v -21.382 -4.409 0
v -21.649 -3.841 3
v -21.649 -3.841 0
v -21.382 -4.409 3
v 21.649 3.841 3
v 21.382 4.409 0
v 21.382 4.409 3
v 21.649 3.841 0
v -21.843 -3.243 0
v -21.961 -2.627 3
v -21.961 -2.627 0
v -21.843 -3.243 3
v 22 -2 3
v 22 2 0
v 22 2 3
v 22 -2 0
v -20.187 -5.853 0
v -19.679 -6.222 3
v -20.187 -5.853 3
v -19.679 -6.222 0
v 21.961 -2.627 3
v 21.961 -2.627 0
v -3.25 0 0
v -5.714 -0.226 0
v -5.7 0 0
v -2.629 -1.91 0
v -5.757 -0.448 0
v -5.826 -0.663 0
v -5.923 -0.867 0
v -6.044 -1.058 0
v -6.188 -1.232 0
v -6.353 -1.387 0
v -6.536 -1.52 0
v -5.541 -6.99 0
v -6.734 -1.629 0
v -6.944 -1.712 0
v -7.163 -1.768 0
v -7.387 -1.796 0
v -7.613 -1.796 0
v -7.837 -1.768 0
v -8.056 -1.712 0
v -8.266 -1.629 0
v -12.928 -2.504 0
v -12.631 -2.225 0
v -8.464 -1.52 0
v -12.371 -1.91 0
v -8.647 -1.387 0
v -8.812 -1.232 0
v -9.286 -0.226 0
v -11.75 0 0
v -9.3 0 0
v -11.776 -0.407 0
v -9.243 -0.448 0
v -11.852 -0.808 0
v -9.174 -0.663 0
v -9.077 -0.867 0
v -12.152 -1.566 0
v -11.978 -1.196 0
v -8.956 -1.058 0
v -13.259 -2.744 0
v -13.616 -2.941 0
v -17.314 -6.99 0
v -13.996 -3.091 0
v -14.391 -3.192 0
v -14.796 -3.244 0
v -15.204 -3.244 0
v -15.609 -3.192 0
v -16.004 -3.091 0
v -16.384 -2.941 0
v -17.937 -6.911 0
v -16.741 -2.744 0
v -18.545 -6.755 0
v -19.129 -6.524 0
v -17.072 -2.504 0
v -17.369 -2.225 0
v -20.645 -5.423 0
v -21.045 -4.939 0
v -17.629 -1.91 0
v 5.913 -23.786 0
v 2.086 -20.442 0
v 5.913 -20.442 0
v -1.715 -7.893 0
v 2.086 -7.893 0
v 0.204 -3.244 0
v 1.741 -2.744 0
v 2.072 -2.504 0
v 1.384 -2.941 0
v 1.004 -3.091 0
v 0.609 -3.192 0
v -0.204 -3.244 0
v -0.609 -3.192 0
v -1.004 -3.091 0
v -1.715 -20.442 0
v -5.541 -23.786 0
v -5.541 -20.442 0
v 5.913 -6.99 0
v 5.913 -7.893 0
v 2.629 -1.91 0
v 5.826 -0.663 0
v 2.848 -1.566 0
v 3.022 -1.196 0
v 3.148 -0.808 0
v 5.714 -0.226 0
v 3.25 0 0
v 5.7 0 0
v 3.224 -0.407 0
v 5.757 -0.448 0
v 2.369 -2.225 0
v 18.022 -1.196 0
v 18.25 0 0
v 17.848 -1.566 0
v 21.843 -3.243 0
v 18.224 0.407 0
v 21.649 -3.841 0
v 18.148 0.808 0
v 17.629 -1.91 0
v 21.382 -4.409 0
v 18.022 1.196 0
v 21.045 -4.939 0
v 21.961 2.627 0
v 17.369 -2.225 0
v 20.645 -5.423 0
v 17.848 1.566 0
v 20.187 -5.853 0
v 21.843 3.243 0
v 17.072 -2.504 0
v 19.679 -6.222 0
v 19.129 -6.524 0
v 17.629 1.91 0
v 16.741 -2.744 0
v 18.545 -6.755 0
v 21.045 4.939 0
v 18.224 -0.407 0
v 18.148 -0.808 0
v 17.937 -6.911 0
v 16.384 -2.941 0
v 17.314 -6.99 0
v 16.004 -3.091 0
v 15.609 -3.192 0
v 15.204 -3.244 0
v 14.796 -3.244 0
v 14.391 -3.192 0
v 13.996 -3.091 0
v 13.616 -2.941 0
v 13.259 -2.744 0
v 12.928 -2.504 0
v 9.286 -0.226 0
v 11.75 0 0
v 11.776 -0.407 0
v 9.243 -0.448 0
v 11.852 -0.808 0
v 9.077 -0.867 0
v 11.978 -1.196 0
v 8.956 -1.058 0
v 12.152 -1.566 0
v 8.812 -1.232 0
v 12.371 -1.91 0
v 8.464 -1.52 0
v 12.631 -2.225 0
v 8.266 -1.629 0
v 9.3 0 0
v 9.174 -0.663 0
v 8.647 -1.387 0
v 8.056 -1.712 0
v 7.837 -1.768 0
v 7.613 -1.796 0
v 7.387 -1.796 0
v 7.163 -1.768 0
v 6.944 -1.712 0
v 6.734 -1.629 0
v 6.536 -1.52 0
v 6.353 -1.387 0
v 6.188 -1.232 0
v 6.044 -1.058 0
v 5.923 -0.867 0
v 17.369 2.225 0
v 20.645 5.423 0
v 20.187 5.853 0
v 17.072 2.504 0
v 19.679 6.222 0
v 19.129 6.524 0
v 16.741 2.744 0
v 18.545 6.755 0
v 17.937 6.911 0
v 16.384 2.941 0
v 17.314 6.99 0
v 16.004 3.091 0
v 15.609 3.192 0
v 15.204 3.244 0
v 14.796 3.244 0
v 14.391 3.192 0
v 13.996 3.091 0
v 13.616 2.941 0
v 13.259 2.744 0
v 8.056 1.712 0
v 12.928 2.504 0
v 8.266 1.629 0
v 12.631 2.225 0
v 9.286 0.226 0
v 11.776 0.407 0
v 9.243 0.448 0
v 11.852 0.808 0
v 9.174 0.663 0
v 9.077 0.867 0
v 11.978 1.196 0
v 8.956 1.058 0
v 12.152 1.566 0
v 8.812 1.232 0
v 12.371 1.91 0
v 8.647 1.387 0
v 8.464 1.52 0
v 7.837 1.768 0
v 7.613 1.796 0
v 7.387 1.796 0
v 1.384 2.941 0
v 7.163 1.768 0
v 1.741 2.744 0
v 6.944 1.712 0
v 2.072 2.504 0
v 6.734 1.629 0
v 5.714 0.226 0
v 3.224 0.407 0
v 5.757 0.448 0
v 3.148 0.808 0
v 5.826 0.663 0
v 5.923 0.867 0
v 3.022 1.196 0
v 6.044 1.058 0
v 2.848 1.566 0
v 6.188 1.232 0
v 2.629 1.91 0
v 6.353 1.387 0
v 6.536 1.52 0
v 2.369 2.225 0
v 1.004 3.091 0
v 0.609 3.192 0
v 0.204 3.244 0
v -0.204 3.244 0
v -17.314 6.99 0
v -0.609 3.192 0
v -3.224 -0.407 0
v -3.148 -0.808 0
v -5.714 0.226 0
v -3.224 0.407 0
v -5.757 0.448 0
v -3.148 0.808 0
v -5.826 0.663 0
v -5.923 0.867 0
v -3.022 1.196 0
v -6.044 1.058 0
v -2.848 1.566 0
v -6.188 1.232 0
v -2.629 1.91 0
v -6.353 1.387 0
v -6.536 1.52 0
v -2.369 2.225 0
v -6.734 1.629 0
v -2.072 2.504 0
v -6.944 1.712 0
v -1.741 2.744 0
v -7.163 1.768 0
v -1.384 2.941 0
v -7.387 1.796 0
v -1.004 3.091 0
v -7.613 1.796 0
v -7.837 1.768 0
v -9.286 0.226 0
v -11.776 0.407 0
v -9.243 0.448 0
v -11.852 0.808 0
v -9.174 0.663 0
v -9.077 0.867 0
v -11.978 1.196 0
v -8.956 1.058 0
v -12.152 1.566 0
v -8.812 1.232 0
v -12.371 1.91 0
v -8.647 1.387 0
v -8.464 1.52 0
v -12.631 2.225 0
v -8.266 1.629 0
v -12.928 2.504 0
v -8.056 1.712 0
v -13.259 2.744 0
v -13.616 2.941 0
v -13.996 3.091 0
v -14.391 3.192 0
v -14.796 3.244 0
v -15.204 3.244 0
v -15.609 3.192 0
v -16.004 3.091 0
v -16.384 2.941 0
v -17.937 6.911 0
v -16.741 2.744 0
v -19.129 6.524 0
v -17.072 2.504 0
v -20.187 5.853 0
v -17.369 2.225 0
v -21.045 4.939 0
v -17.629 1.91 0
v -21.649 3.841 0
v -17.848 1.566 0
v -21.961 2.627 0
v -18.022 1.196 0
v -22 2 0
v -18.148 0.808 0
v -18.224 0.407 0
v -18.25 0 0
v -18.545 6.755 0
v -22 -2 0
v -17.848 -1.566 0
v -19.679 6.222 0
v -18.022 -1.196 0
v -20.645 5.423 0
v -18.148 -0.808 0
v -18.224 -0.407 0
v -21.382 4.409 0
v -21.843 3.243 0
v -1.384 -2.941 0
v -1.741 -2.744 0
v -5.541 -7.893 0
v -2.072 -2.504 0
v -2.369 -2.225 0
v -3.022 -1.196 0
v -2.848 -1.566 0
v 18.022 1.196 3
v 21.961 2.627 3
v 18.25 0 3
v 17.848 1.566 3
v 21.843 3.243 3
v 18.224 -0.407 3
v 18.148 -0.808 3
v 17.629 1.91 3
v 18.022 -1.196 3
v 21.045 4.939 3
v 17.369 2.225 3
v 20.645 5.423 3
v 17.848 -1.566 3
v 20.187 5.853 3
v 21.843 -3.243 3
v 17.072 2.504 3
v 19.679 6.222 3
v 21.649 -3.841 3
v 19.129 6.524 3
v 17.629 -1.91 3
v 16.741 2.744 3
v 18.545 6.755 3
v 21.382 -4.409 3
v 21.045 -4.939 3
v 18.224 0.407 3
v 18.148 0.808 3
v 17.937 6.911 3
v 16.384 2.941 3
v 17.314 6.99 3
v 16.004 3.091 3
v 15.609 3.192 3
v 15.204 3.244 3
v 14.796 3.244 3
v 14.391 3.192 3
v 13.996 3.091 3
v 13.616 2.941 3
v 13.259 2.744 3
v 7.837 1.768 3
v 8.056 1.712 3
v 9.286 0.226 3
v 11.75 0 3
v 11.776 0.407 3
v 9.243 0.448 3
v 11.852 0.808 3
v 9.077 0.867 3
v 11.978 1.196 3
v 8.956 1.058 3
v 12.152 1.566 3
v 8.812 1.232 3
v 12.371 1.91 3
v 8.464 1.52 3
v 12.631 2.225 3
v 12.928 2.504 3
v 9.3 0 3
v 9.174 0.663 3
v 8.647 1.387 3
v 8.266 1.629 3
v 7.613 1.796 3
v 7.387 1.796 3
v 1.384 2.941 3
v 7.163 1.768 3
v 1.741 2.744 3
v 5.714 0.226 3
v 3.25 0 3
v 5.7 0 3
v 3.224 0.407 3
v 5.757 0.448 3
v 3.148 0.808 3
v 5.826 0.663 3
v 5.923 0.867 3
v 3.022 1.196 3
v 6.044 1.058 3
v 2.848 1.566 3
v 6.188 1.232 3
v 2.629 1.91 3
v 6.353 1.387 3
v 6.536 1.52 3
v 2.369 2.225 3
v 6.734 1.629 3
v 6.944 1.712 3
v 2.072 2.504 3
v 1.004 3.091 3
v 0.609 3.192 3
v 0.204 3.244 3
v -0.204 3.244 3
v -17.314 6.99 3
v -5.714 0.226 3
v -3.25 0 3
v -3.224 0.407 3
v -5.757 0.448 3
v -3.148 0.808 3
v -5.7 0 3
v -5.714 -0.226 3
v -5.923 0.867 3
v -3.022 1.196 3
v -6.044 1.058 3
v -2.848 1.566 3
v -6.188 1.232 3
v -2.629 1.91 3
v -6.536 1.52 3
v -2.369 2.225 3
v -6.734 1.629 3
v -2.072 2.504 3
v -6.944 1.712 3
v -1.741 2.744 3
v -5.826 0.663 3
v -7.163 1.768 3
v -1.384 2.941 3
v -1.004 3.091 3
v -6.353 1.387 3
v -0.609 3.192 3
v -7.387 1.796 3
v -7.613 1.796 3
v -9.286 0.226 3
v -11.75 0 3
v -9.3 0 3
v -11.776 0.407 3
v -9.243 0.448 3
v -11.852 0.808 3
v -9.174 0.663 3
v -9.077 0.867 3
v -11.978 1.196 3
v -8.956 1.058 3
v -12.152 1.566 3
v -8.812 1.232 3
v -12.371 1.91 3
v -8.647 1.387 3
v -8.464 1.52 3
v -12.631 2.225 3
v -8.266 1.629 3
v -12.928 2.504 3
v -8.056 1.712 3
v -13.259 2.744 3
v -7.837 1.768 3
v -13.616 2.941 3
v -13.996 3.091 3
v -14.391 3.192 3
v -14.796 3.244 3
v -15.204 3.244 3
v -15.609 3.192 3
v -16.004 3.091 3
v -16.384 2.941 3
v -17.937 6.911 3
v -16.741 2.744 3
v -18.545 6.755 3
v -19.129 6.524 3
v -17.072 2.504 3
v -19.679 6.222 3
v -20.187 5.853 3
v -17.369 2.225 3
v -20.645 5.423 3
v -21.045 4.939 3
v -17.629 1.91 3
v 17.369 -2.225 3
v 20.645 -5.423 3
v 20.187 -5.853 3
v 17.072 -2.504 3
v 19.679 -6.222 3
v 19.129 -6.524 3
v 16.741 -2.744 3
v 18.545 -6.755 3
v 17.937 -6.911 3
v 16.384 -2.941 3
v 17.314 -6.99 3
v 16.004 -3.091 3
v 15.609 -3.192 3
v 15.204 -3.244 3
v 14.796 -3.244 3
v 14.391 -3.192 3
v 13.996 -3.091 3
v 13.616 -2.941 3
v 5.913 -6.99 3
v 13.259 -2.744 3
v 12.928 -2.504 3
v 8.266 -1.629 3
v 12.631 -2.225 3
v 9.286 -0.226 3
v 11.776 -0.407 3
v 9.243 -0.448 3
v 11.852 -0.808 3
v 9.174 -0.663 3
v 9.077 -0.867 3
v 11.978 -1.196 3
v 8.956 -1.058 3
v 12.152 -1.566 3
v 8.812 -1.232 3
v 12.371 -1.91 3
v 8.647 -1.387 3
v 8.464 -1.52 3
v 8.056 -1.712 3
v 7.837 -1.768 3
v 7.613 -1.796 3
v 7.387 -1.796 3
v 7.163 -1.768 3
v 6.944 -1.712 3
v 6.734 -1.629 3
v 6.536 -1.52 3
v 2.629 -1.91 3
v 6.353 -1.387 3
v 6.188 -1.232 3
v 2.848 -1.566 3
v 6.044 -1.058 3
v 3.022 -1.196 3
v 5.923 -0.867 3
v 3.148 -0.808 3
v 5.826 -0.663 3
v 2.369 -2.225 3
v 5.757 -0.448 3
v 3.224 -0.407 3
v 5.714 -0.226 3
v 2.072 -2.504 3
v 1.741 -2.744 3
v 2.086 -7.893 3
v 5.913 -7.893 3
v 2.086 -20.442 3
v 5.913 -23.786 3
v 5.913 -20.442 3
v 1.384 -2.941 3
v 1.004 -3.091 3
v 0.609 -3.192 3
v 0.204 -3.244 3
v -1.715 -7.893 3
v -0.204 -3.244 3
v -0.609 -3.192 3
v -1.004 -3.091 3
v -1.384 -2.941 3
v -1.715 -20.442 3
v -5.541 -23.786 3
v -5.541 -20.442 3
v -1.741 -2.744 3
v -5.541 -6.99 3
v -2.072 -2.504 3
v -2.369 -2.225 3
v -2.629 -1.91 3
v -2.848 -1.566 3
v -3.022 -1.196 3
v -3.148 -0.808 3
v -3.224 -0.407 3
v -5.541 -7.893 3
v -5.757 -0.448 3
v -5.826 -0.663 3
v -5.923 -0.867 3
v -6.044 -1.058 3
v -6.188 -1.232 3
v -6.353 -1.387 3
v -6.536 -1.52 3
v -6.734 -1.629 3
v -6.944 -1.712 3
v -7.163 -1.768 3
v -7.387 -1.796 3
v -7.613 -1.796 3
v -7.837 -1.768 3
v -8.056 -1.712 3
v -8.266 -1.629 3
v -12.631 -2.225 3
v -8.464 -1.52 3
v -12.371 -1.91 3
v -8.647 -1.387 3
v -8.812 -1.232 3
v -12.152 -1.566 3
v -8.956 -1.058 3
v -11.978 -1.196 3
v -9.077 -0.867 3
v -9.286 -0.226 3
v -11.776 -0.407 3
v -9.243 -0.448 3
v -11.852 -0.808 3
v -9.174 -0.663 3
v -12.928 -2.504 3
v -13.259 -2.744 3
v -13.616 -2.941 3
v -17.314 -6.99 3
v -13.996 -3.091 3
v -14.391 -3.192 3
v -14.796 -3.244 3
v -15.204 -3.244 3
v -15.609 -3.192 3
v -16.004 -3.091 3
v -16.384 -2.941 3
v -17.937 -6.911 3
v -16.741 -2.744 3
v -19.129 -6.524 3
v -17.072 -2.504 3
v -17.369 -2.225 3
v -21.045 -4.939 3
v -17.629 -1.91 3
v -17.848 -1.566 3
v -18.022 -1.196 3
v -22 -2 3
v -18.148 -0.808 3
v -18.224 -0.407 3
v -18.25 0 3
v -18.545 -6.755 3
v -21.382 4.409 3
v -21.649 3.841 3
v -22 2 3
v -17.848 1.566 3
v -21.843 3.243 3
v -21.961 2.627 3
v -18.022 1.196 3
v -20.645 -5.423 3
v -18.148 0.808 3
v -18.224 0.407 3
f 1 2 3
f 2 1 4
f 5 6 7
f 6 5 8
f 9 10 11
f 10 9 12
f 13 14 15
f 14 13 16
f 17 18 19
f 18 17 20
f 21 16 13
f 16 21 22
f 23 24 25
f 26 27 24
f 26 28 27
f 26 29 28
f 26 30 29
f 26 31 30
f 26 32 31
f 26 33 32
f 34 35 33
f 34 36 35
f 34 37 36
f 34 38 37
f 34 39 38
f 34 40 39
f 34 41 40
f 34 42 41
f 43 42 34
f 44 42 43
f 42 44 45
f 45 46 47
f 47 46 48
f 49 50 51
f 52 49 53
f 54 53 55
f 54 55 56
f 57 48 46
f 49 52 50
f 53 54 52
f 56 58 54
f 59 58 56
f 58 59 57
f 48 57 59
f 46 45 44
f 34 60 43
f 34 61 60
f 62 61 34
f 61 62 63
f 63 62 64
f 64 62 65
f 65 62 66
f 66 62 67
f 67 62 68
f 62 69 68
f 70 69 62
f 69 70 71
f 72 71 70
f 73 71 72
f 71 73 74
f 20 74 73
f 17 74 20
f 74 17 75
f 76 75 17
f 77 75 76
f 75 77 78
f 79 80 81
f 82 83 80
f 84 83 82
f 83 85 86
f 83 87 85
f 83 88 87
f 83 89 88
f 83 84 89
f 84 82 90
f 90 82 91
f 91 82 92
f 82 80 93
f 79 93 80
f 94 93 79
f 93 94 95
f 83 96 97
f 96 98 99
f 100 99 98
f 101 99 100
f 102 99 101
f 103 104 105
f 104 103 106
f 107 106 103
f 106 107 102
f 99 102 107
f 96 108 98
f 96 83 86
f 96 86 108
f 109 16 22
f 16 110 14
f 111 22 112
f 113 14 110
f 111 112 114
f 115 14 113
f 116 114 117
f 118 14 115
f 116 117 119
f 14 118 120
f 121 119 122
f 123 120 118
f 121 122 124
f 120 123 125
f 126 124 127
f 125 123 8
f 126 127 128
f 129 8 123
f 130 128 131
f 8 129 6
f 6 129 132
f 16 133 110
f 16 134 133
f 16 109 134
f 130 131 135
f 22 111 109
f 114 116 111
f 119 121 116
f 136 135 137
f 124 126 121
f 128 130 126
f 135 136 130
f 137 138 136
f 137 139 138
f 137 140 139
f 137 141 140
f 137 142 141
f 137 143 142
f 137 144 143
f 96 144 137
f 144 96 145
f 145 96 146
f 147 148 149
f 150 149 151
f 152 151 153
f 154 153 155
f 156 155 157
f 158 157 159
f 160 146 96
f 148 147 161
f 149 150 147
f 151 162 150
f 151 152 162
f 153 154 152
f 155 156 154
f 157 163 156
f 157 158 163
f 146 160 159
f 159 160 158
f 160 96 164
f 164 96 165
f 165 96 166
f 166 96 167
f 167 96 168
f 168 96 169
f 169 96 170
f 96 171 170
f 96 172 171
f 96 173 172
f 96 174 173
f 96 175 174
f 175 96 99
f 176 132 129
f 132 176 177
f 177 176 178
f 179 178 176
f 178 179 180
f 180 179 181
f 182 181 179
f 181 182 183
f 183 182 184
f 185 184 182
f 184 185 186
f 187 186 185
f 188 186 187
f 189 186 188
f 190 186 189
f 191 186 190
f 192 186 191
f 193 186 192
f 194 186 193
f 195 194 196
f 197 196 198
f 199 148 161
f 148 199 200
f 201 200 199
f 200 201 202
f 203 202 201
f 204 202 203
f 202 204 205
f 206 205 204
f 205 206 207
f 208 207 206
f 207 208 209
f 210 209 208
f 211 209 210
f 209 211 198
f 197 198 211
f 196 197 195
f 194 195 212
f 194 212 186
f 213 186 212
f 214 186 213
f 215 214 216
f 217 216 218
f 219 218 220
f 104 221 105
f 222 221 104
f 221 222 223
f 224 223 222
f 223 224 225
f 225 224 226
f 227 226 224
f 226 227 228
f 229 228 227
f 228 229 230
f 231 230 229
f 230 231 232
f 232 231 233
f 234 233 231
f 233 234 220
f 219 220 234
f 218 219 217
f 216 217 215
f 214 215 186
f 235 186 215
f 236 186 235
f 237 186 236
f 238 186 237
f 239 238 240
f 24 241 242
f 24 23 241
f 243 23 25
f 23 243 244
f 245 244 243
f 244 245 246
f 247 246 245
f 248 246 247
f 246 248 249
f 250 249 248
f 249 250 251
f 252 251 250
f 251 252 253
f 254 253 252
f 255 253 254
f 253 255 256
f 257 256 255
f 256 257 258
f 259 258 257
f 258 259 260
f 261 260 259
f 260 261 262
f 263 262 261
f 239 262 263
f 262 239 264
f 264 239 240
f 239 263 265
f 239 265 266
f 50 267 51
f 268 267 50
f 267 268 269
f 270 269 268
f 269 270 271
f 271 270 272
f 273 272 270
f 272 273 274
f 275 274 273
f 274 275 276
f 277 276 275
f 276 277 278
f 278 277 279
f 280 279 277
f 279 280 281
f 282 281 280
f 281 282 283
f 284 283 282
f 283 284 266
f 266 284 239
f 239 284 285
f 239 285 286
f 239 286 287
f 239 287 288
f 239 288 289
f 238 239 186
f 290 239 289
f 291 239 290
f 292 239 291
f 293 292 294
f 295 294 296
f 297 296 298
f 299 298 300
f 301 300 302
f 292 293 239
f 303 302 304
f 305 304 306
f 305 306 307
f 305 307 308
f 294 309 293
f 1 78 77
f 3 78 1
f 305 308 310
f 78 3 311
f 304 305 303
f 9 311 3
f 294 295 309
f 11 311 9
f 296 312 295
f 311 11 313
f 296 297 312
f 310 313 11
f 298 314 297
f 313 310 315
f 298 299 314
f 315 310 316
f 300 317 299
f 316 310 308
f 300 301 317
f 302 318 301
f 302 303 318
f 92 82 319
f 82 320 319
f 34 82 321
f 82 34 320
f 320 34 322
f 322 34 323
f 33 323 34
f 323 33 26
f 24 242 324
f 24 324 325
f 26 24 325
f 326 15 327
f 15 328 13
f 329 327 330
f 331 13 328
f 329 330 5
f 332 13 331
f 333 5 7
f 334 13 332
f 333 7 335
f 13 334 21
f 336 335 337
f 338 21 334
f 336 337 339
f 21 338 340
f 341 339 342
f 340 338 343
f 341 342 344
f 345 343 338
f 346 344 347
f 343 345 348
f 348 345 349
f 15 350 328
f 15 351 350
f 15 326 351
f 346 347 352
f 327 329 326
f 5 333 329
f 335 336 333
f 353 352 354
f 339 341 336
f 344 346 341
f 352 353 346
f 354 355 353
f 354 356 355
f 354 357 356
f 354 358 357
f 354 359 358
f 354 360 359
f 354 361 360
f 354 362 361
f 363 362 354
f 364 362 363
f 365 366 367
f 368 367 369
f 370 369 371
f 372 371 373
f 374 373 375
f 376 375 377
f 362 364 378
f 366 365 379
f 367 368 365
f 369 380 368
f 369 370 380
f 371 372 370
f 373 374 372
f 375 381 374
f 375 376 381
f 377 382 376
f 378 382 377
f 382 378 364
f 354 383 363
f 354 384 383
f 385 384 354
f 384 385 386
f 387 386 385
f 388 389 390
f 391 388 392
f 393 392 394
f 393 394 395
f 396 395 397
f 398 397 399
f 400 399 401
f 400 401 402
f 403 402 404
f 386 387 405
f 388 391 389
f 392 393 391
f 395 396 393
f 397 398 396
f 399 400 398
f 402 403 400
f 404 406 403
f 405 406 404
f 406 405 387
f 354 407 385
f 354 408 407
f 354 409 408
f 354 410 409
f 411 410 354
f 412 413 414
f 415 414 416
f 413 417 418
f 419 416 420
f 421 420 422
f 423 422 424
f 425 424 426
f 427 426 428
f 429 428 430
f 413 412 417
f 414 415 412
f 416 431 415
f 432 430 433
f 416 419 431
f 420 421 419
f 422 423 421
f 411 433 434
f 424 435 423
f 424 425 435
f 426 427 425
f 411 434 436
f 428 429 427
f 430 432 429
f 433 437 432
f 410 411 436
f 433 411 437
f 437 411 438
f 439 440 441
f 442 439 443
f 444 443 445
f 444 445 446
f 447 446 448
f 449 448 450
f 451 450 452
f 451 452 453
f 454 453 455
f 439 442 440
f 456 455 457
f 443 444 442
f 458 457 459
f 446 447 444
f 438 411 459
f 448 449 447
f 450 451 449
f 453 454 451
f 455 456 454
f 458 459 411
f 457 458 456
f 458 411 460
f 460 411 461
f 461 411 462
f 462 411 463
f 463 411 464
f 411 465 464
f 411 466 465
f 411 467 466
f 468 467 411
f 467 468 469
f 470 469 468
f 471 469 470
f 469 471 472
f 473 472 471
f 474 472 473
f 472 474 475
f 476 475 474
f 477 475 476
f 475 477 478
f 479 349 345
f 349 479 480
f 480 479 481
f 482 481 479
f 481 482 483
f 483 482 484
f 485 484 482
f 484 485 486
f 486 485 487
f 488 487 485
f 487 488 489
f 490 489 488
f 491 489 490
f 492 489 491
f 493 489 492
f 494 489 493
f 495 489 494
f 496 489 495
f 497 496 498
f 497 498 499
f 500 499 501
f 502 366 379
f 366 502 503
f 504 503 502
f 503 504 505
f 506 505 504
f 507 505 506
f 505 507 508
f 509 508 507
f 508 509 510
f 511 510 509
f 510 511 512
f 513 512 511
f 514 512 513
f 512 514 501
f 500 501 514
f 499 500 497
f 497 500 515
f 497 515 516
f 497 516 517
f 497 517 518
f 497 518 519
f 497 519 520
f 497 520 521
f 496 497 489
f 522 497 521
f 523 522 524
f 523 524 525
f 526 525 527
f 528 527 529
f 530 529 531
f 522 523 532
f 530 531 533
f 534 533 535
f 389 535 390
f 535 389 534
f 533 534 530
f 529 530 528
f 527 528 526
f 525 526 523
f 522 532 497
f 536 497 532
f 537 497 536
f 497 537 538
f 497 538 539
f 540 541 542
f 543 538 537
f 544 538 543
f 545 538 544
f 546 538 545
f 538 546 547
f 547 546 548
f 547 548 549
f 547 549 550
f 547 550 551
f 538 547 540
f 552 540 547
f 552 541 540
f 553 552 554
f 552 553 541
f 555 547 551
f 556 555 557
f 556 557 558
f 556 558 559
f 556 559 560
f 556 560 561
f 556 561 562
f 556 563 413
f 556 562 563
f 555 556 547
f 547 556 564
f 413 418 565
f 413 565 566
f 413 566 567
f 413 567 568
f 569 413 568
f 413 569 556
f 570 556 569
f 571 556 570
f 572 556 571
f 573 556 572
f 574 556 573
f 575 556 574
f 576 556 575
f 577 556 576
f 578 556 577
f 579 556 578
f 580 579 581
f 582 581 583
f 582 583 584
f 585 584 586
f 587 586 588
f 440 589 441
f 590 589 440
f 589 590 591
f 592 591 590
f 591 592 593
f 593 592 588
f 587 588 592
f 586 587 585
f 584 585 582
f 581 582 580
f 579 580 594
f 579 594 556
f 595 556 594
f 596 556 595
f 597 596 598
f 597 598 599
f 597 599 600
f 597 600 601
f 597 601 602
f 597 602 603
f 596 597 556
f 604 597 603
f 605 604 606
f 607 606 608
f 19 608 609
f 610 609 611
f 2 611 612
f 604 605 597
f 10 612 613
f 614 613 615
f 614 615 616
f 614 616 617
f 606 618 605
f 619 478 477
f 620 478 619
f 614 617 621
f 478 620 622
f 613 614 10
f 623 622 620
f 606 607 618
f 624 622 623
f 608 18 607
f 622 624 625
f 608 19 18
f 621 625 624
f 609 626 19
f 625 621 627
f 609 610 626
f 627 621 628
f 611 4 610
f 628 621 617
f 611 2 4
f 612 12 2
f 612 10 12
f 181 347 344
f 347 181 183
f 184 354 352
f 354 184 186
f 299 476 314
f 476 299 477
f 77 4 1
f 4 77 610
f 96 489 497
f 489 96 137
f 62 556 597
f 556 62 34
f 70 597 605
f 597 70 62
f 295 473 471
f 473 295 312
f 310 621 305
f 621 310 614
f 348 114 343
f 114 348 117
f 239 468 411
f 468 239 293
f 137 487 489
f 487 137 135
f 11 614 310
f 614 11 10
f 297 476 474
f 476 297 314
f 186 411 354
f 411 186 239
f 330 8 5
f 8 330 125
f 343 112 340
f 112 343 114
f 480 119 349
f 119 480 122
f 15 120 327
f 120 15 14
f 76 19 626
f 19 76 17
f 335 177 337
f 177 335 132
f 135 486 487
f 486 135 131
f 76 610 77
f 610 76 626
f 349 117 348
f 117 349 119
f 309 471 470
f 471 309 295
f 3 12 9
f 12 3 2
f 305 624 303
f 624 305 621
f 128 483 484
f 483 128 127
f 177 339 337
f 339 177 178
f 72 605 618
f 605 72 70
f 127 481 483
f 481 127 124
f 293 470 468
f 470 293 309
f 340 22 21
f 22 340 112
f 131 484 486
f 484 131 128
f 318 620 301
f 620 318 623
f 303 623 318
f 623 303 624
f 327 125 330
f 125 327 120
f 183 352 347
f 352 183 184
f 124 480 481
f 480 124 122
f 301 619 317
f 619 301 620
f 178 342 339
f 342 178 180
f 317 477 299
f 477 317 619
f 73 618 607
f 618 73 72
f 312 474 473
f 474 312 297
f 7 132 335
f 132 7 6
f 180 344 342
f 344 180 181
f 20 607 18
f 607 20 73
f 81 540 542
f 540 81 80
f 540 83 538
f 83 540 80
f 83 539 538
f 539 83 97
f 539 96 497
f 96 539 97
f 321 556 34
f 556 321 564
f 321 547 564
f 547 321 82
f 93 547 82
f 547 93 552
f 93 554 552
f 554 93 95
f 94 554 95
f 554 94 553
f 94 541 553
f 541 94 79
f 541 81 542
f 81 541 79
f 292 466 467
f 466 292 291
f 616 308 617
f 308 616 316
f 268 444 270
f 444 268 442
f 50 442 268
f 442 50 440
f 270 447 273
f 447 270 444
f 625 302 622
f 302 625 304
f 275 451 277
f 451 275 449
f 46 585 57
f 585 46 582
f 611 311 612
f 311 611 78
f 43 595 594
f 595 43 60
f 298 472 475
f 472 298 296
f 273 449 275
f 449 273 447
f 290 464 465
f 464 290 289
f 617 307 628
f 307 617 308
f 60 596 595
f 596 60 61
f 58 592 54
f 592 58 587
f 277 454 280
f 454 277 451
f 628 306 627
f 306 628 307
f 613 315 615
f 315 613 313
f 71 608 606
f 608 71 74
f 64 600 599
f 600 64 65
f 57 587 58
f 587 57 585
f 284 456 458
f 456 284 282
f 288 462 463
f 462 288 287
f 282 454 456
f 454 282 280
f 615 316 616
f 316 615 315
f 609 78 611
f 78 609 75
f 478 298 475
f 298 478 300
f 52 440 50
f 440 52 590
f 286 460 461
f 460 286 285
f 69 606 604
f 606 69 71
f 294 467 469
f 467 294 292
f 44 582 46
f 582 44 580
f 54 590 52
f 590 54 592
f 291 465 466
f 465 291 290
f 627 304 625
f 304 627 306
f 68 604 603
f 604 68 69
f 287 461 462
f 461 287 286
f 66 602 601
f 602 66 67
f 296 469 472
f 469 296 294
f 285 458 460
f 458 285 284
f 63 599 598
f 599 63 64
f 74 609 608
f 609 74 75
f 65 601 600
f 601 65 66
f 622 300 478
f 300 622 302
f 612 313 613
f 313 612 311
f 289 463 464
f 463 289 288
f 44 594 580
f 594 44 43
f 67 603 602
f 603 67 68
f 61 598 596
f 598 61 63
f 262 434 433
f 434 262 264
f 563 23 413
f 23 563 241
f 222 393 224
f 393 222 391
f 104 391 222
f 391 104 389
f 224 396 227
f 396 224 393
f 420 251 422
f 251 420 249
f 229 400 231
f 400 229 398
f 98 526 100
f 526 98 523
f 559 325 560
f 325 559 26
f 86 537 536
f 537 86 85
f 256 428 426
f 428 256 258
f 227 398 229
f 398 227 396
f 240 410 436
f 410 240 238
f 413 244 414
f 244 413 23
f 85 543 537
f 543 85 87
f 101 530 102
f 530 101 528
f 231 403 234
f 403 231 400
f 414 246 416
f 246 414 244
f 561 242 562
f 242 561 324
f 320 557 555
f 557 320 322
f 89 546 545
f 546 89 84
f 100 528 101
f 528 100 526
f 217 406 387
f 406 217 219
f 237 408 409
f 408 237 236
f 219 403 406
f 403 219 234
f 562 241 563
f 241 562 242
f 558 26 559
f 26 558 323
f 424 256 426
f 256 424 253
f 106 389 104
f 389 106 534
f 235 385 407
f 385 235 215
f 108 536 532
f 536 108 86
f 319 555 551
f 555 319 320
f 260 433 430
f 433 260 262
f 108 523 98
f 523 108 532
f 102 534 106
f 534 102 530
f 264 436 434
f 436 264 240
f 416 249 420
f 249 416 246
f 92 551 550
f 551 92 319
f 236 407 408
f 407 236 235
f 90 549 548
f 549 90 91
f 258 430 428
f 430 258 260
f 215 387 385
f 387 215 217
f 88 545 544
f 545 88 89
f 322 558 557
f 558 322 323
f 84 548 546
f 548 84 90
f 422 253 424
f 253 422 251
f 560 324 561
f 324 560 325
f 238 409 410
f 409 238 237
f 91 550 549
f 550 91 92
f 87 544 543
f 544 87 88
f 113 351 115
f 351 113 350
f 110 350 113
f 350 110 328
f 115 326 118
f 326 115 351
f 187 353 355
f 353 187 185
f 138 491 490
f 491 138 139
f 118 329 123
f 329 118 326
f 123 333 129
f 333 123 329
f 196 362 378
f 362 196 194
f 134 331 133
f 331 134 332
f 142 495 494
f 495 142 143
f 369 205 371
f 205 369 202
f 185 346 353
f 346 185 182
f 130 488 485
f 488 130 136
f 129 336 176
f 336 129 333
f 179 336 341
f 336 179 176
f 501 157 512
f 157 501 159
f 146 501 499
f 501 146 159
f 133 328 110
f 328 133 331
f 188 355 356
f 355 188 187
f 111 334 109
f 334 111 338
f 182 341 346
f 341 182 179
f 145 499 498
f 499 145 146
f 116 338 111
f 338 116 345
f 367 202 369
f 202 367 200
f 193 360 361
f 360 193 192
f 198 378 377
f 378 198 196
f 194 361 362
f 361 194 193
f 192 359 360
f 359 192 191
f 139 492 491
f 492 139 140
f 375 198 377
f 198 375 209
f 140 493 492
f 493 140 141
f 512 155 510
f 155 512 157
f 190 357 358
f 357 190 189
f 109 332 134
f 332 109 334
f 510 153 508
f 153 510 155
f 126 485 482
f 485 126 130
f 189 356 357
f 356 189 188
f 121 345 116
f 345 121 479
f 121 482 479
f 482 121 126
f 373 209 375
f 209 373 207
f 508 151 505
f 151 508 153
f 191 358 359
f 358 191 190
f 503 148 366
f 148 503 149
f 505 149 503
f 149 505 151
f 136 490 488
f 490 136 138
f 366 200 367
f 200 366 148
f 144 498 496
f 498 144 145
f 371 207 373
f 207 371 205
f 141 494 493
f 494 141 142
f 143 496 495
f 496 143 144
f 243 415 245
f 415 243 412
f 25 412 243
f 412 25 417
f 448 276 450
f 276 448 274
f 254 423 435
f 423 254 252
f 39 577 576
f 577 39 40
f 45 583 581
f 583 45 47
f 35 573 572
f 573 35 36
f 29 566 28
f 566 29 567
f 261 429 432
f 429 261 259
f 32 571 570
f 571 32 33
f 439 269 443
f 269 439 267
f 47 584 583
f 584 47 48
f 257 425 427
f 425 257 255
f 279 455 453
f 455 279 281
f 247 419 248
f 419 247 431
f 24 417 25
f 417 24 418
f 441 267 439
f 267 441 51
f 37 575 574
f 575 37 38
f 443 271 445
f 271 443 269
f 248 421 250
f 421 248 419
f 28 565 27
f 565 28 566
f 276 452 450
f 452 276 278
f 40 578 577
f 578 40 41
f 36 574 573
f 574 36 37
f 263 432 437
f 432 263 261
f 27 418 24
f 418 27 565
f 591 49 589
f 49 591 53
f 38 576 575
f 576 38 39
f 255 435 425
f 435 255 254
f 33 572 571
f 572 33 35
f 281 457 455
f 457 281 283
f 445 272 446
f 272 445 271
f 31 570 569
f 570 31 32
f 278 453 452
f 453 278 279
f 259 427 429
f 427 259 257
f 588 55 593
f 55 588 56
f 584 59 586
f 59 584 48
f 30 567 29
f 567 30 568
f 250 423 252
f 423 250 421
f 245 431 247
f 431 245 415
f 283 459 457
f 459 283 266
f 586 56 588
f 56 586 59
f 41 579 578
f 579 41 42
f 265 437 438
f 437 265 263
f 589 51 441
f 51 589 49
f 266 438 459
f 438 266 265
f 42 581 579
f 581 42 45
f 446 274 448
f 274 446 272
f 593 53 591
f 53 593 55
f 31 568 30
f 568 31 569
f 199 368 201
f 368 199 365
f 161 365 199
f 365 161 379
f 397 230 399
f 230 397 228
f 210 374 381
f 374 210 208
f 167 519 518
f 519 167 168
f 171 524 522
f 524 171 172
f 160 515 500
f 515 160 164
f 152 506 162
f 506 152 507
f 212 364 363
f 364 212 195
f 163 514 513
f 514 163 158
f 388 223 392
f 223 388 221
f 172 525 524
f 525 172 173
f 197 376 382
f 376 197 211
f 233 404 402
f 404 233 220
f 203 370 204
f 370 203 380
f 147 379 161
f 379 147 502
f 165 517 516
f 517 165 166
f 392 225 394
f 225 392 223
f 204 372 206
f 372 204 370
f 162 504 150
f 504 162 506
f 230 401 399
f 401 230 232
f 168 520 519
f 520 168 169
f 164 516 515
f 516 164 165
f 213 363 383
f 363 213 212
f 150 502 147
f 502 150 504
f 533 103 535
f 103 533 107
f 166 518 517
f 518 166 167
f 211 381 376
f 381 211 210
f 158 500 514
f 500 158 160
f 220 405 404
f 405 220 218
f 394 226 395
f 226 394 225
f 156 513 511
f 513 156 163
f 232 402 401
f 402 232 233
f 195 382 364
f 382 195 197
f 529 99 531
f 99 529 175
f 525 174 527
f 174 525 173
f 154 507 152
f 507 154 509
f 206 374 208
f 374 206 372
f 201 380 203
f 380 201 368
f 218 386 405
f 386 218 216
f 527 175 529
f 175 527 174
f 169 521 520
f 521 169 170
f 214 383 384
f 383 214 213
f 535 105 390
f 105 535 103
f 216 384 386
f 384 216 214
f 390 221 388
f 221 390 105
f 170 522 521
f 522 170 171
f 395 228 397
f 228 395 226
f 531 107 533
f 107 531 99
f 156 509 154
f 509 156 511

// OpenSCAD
$fn = 50;


difference() {
	union() {
		hull() {
			translate(v = [-17.0000000000, 2.0000000000, 0]) {
				cylinder(h = 3, r = 5);
			}
			translate(v = [17.0000000000, 2.0000000000, 0]) {
				cylinder(h = 3, r = 5);
			}
			translate(v = [-17.0000000000, -2.0000000000, 0]) {
				cylinder(h = 3, r = 5);
			}
			translate(v = [17.0000000000, -2.0000000000, 0]) {
				cylinder(h = 3, r = 5);
			}
		}
		translate(v = [0, -5, 0]) {
			linear_extrude(height = 3) {
				text(font = "DejaVu Sans Mono:style=Bold", halign = "center", size = 19.0000000000, text = "I", valign = "top");
			}
		}
	}
	union() {
		translate(v = [-15.0000000000, 0.0000000000, 0]) {
			translate(v = [0, 0, -100]) {
				cylinder(h = 200, r = 3.2500000000);
			}
		}
		translate(v = [0, 0, -100]) {
			cylinder(h = 200, r = 3.2500000000);
		}
		translate(v = [15.0000000000, 0.0000000000, 0]) {
			translate(v = [0, 0, -100]) {
				cylinder(h = 200, r = 3.2500000000);
			}
		}
		translate(v = [-15.0000000000, 0.0000000000, 0]) {
			translate(v = [0, 0, -100]) {
				cylinder(h = 200, r = 1.8000000000);
			}
		}
		translate(v = [-7.5000000000, 0.0000000000, 0]) {
			translate(v = [0, 0, -100]) {
				cylinder(h = 200, r = 1.8000000000);
			}
		}
		translate(v = [0, 0, -100]) {
			cylinder(h = 200, r = 1.8000000000);
		}
		translate(v = [7.5000000000, 0.0000000000, 0]) {
			translate(v = [0, 0, -100]) {
				cylinder(h = 200, r = 1.8000000000);
			}
		}
		translate(v = [15.0000000000, 0.0000000000, 0]) {
			translate(v = [0, 0, -100]) {
				cylinder(h = 200, r = 1.8000000000);
			}
		}
	}
}
